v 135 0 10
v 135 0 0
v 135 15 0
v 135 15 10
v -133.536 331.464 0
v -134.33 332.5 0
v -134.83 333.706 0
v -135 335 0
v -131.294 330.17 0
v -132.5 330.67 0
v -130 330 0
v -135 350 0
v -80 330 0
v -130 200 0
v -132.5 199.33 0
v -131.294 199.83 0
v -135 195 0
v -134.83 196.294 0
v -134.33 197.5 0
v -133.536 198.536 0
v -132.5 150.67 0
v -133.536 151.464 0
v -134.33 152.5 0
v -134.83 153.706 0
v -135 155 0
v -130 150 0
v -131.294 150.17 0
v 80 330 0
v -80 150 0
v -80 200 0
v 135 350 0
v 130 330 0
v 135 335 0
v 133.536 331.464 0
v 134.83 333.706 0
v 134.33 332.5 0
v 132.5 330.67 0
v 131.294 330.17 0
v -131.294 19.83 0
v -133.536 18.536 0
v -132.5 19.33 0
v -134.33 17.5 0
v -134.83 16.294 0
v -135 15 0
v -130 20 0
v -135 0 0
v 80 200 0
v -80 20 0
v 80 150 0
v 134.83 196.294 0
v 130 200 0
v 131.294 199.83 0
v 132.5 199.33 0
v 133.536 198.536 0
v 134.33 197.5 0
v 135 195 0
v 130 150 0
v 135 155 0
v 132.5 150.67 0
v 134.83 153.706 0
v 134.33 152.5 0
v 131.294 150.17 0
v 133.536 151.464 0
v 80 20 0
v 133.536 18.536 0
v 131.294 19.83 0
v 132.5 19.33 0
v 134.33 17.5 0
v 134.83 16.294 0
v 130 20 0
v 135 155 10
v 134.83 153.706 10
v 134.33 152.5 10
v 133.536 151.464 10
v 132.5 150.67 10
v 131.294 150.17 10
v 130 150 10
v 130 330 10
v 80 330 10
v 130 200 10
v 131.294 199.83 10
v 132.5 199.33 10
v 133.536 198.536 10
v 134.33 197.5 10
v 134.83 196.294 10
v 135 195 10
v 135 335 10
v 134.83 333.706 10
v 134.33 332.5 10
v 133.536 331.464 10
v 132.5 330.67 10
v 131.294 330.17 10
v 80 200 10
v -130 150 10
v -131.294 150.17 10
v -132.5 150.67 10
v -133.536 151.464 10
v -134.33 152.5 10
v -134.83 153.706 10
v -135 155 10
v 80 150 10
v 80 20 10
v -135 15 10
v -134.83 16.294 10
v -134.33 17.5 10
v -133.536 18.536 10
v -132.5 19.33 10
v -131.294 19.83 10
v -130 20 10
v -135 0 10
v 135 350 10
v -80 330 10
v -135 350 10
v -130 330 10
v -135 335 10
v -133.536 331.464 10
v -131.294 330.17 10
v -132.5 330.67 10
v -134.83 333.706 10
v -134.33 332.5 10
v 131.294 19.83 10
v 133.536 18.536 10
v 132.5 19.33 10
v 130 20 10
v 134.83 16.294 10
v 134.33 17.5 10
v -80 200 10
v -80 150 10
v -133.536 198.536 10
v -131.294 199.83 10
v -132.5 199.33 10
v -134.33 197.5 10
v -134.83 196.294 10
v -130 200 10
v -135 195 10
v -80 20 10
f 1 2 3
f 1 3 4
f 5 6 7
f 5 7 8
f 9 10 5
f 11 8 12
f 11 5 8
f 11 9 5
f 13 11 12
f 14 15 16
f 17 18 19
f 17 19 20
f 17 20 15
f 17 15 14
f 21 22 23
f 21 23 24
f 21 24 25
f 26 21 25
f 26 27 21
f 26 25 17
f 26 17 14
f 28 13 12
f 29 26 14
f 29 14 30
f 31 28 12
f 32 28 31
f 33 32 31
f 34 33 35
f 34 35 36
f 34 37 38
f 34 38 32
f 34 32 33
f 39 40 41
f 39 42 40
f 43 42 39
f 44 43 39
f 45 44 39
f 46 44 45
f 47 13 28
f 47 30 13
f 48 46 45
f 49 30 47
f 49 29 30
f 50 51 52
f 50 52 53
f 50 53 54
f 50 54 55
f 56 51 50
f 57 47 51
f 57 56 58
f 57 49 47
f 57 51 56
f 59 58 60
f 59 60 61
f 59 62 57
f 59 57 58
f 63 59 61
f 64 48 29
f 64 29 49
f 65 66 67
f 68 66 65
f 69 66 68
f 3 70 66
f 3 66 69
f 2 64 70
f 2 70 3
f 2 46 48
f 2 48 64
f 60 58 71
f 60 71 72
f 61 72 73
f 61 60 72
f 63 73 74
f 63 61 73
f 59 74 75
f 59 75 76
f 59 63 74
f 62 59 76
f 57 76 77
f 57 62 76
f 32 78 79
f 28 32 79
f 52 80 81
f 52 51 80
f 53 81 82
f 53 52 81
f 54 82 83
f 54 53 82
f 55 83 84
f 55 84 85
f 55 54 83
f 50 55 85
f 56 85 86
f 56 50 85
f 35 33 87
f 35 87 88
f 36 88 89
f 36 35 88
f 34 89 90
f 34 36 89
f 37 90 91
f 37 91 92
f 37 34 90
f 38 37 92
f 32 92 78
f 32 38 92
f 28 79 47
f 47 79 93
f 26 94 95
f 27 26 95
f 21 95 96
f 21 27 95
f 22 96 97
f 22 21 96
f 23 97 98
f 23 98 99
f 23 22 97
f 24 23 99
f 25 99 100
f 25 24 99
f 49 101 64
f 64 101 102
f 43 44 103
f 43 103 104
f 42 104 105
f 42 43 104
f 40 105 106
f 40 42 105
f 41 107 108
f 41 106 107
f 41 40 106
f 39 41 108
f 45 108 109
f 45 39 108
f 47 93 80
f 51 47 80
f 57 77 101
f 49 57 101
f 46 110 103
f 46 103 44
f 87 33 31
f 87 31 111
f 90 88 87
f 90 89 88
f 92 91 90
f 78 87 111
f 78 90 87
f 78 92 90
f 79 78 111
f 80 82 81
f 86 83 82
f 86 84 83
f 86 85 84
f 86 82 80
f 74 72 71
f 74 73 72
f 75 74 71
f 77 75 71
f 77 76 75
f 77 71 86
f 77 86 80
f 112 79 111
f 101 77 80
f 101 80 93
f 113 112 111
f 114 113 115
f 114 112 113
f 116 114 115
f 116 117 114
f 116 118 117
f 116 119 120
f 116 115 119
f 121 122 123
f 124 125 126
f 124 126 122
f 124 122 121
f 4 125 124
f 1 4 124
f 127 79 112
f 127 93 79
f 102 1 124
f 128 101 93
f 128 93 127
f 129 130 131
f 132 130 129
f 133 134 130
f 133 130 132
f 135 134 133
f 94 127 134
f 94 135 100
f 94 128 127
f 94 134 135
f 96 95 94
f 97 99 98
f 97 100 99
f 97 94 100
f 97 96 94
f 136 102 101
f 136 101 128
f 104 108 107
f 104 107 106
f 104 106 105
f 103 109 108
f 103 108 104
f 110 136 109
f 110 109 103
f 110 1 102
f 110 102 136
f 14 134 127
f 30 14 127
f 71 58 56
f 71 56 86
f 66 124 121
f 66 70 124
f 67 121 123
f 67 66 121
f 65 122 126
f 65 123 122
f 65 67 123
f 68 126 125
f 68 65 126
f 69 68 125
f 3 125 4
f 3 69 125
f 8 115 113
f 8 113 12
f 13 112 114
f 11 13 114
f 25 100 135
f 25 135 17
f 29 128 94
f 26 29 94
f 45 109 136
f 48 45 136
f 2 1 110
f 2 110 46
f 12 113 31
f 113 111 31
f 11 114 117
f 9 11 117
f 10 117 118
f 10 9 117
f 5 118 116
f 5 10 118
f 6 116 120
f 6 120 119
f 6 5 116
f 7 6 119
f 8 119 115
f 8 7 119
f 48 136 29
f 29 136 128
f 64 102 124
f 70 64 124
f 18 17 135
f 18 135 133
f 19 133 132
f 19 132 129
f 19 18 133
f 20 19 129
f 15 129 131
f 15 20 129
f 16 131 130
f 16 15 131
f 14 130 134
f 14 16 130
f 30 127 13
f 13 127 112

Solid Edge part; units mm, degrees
sketch "Sketch1" plane through (0, 0, 0) normal (0, -1, 0) x (1, 0, 0)
  line L0 (135, 0) -> (135, 10)
  line L1 (135, 10) -> (-135, 10)
  line L2 (-135, 10) -> (-135, 0)
  line L3 (-135, 0) -> (135, 0)
extrude "Protrusion1" add sketch "Sketch1" against normal blind 350
sketch "Sketch2" plane through (0, 175, 10) normal (0, 0, 1) x (1, 0, 0)
  line L0 (-135, 25) -> (-80, 25)
  line L1 (-80, 25) -> (-80, 155)
  line L2 (-80, 155) -> (-135, 155)
  line L3 (-135, 155) -> (-135, 25)
extrude "ExtrudedCutout_2" cut sketch "Sketch2" against normal blind 39.4331
mirror "Mirror1" about plane through (0, 0, 0) normal (1, 0, 0) of "ExtrudedCutout_2"
sketch "Sketch3" plane through (0, 175, 10) normal (0, 0, 1) x (1, 0, 0)
  line L0 (-135, -155) -> (-80, -155)
  line L1 (-80, -155) -> (-80, -25)
  line L2 (-80, -25) -> (-135, -25)
  line L3 (-135, -25) -> (-135, -155)
extrude "ExtrudedCutout_13" cut sketch "Sketch3" against normal blind 106.055
mirror "Mirror2" about plane through (0, 0, 0) normal (1, 0, 0) of "ExtrudedCutout_13"
fillet "Round_5" radius 5 4 edges at (135, 150, 5) (135, 200, 5) (-135, 150, 5) (-135, 200, 5)
fillet "Round_7" radius 5 4 edges at (135, 330, 5) (-135, 330, 5) (135, 20, 5) (-135, 20, 5)
